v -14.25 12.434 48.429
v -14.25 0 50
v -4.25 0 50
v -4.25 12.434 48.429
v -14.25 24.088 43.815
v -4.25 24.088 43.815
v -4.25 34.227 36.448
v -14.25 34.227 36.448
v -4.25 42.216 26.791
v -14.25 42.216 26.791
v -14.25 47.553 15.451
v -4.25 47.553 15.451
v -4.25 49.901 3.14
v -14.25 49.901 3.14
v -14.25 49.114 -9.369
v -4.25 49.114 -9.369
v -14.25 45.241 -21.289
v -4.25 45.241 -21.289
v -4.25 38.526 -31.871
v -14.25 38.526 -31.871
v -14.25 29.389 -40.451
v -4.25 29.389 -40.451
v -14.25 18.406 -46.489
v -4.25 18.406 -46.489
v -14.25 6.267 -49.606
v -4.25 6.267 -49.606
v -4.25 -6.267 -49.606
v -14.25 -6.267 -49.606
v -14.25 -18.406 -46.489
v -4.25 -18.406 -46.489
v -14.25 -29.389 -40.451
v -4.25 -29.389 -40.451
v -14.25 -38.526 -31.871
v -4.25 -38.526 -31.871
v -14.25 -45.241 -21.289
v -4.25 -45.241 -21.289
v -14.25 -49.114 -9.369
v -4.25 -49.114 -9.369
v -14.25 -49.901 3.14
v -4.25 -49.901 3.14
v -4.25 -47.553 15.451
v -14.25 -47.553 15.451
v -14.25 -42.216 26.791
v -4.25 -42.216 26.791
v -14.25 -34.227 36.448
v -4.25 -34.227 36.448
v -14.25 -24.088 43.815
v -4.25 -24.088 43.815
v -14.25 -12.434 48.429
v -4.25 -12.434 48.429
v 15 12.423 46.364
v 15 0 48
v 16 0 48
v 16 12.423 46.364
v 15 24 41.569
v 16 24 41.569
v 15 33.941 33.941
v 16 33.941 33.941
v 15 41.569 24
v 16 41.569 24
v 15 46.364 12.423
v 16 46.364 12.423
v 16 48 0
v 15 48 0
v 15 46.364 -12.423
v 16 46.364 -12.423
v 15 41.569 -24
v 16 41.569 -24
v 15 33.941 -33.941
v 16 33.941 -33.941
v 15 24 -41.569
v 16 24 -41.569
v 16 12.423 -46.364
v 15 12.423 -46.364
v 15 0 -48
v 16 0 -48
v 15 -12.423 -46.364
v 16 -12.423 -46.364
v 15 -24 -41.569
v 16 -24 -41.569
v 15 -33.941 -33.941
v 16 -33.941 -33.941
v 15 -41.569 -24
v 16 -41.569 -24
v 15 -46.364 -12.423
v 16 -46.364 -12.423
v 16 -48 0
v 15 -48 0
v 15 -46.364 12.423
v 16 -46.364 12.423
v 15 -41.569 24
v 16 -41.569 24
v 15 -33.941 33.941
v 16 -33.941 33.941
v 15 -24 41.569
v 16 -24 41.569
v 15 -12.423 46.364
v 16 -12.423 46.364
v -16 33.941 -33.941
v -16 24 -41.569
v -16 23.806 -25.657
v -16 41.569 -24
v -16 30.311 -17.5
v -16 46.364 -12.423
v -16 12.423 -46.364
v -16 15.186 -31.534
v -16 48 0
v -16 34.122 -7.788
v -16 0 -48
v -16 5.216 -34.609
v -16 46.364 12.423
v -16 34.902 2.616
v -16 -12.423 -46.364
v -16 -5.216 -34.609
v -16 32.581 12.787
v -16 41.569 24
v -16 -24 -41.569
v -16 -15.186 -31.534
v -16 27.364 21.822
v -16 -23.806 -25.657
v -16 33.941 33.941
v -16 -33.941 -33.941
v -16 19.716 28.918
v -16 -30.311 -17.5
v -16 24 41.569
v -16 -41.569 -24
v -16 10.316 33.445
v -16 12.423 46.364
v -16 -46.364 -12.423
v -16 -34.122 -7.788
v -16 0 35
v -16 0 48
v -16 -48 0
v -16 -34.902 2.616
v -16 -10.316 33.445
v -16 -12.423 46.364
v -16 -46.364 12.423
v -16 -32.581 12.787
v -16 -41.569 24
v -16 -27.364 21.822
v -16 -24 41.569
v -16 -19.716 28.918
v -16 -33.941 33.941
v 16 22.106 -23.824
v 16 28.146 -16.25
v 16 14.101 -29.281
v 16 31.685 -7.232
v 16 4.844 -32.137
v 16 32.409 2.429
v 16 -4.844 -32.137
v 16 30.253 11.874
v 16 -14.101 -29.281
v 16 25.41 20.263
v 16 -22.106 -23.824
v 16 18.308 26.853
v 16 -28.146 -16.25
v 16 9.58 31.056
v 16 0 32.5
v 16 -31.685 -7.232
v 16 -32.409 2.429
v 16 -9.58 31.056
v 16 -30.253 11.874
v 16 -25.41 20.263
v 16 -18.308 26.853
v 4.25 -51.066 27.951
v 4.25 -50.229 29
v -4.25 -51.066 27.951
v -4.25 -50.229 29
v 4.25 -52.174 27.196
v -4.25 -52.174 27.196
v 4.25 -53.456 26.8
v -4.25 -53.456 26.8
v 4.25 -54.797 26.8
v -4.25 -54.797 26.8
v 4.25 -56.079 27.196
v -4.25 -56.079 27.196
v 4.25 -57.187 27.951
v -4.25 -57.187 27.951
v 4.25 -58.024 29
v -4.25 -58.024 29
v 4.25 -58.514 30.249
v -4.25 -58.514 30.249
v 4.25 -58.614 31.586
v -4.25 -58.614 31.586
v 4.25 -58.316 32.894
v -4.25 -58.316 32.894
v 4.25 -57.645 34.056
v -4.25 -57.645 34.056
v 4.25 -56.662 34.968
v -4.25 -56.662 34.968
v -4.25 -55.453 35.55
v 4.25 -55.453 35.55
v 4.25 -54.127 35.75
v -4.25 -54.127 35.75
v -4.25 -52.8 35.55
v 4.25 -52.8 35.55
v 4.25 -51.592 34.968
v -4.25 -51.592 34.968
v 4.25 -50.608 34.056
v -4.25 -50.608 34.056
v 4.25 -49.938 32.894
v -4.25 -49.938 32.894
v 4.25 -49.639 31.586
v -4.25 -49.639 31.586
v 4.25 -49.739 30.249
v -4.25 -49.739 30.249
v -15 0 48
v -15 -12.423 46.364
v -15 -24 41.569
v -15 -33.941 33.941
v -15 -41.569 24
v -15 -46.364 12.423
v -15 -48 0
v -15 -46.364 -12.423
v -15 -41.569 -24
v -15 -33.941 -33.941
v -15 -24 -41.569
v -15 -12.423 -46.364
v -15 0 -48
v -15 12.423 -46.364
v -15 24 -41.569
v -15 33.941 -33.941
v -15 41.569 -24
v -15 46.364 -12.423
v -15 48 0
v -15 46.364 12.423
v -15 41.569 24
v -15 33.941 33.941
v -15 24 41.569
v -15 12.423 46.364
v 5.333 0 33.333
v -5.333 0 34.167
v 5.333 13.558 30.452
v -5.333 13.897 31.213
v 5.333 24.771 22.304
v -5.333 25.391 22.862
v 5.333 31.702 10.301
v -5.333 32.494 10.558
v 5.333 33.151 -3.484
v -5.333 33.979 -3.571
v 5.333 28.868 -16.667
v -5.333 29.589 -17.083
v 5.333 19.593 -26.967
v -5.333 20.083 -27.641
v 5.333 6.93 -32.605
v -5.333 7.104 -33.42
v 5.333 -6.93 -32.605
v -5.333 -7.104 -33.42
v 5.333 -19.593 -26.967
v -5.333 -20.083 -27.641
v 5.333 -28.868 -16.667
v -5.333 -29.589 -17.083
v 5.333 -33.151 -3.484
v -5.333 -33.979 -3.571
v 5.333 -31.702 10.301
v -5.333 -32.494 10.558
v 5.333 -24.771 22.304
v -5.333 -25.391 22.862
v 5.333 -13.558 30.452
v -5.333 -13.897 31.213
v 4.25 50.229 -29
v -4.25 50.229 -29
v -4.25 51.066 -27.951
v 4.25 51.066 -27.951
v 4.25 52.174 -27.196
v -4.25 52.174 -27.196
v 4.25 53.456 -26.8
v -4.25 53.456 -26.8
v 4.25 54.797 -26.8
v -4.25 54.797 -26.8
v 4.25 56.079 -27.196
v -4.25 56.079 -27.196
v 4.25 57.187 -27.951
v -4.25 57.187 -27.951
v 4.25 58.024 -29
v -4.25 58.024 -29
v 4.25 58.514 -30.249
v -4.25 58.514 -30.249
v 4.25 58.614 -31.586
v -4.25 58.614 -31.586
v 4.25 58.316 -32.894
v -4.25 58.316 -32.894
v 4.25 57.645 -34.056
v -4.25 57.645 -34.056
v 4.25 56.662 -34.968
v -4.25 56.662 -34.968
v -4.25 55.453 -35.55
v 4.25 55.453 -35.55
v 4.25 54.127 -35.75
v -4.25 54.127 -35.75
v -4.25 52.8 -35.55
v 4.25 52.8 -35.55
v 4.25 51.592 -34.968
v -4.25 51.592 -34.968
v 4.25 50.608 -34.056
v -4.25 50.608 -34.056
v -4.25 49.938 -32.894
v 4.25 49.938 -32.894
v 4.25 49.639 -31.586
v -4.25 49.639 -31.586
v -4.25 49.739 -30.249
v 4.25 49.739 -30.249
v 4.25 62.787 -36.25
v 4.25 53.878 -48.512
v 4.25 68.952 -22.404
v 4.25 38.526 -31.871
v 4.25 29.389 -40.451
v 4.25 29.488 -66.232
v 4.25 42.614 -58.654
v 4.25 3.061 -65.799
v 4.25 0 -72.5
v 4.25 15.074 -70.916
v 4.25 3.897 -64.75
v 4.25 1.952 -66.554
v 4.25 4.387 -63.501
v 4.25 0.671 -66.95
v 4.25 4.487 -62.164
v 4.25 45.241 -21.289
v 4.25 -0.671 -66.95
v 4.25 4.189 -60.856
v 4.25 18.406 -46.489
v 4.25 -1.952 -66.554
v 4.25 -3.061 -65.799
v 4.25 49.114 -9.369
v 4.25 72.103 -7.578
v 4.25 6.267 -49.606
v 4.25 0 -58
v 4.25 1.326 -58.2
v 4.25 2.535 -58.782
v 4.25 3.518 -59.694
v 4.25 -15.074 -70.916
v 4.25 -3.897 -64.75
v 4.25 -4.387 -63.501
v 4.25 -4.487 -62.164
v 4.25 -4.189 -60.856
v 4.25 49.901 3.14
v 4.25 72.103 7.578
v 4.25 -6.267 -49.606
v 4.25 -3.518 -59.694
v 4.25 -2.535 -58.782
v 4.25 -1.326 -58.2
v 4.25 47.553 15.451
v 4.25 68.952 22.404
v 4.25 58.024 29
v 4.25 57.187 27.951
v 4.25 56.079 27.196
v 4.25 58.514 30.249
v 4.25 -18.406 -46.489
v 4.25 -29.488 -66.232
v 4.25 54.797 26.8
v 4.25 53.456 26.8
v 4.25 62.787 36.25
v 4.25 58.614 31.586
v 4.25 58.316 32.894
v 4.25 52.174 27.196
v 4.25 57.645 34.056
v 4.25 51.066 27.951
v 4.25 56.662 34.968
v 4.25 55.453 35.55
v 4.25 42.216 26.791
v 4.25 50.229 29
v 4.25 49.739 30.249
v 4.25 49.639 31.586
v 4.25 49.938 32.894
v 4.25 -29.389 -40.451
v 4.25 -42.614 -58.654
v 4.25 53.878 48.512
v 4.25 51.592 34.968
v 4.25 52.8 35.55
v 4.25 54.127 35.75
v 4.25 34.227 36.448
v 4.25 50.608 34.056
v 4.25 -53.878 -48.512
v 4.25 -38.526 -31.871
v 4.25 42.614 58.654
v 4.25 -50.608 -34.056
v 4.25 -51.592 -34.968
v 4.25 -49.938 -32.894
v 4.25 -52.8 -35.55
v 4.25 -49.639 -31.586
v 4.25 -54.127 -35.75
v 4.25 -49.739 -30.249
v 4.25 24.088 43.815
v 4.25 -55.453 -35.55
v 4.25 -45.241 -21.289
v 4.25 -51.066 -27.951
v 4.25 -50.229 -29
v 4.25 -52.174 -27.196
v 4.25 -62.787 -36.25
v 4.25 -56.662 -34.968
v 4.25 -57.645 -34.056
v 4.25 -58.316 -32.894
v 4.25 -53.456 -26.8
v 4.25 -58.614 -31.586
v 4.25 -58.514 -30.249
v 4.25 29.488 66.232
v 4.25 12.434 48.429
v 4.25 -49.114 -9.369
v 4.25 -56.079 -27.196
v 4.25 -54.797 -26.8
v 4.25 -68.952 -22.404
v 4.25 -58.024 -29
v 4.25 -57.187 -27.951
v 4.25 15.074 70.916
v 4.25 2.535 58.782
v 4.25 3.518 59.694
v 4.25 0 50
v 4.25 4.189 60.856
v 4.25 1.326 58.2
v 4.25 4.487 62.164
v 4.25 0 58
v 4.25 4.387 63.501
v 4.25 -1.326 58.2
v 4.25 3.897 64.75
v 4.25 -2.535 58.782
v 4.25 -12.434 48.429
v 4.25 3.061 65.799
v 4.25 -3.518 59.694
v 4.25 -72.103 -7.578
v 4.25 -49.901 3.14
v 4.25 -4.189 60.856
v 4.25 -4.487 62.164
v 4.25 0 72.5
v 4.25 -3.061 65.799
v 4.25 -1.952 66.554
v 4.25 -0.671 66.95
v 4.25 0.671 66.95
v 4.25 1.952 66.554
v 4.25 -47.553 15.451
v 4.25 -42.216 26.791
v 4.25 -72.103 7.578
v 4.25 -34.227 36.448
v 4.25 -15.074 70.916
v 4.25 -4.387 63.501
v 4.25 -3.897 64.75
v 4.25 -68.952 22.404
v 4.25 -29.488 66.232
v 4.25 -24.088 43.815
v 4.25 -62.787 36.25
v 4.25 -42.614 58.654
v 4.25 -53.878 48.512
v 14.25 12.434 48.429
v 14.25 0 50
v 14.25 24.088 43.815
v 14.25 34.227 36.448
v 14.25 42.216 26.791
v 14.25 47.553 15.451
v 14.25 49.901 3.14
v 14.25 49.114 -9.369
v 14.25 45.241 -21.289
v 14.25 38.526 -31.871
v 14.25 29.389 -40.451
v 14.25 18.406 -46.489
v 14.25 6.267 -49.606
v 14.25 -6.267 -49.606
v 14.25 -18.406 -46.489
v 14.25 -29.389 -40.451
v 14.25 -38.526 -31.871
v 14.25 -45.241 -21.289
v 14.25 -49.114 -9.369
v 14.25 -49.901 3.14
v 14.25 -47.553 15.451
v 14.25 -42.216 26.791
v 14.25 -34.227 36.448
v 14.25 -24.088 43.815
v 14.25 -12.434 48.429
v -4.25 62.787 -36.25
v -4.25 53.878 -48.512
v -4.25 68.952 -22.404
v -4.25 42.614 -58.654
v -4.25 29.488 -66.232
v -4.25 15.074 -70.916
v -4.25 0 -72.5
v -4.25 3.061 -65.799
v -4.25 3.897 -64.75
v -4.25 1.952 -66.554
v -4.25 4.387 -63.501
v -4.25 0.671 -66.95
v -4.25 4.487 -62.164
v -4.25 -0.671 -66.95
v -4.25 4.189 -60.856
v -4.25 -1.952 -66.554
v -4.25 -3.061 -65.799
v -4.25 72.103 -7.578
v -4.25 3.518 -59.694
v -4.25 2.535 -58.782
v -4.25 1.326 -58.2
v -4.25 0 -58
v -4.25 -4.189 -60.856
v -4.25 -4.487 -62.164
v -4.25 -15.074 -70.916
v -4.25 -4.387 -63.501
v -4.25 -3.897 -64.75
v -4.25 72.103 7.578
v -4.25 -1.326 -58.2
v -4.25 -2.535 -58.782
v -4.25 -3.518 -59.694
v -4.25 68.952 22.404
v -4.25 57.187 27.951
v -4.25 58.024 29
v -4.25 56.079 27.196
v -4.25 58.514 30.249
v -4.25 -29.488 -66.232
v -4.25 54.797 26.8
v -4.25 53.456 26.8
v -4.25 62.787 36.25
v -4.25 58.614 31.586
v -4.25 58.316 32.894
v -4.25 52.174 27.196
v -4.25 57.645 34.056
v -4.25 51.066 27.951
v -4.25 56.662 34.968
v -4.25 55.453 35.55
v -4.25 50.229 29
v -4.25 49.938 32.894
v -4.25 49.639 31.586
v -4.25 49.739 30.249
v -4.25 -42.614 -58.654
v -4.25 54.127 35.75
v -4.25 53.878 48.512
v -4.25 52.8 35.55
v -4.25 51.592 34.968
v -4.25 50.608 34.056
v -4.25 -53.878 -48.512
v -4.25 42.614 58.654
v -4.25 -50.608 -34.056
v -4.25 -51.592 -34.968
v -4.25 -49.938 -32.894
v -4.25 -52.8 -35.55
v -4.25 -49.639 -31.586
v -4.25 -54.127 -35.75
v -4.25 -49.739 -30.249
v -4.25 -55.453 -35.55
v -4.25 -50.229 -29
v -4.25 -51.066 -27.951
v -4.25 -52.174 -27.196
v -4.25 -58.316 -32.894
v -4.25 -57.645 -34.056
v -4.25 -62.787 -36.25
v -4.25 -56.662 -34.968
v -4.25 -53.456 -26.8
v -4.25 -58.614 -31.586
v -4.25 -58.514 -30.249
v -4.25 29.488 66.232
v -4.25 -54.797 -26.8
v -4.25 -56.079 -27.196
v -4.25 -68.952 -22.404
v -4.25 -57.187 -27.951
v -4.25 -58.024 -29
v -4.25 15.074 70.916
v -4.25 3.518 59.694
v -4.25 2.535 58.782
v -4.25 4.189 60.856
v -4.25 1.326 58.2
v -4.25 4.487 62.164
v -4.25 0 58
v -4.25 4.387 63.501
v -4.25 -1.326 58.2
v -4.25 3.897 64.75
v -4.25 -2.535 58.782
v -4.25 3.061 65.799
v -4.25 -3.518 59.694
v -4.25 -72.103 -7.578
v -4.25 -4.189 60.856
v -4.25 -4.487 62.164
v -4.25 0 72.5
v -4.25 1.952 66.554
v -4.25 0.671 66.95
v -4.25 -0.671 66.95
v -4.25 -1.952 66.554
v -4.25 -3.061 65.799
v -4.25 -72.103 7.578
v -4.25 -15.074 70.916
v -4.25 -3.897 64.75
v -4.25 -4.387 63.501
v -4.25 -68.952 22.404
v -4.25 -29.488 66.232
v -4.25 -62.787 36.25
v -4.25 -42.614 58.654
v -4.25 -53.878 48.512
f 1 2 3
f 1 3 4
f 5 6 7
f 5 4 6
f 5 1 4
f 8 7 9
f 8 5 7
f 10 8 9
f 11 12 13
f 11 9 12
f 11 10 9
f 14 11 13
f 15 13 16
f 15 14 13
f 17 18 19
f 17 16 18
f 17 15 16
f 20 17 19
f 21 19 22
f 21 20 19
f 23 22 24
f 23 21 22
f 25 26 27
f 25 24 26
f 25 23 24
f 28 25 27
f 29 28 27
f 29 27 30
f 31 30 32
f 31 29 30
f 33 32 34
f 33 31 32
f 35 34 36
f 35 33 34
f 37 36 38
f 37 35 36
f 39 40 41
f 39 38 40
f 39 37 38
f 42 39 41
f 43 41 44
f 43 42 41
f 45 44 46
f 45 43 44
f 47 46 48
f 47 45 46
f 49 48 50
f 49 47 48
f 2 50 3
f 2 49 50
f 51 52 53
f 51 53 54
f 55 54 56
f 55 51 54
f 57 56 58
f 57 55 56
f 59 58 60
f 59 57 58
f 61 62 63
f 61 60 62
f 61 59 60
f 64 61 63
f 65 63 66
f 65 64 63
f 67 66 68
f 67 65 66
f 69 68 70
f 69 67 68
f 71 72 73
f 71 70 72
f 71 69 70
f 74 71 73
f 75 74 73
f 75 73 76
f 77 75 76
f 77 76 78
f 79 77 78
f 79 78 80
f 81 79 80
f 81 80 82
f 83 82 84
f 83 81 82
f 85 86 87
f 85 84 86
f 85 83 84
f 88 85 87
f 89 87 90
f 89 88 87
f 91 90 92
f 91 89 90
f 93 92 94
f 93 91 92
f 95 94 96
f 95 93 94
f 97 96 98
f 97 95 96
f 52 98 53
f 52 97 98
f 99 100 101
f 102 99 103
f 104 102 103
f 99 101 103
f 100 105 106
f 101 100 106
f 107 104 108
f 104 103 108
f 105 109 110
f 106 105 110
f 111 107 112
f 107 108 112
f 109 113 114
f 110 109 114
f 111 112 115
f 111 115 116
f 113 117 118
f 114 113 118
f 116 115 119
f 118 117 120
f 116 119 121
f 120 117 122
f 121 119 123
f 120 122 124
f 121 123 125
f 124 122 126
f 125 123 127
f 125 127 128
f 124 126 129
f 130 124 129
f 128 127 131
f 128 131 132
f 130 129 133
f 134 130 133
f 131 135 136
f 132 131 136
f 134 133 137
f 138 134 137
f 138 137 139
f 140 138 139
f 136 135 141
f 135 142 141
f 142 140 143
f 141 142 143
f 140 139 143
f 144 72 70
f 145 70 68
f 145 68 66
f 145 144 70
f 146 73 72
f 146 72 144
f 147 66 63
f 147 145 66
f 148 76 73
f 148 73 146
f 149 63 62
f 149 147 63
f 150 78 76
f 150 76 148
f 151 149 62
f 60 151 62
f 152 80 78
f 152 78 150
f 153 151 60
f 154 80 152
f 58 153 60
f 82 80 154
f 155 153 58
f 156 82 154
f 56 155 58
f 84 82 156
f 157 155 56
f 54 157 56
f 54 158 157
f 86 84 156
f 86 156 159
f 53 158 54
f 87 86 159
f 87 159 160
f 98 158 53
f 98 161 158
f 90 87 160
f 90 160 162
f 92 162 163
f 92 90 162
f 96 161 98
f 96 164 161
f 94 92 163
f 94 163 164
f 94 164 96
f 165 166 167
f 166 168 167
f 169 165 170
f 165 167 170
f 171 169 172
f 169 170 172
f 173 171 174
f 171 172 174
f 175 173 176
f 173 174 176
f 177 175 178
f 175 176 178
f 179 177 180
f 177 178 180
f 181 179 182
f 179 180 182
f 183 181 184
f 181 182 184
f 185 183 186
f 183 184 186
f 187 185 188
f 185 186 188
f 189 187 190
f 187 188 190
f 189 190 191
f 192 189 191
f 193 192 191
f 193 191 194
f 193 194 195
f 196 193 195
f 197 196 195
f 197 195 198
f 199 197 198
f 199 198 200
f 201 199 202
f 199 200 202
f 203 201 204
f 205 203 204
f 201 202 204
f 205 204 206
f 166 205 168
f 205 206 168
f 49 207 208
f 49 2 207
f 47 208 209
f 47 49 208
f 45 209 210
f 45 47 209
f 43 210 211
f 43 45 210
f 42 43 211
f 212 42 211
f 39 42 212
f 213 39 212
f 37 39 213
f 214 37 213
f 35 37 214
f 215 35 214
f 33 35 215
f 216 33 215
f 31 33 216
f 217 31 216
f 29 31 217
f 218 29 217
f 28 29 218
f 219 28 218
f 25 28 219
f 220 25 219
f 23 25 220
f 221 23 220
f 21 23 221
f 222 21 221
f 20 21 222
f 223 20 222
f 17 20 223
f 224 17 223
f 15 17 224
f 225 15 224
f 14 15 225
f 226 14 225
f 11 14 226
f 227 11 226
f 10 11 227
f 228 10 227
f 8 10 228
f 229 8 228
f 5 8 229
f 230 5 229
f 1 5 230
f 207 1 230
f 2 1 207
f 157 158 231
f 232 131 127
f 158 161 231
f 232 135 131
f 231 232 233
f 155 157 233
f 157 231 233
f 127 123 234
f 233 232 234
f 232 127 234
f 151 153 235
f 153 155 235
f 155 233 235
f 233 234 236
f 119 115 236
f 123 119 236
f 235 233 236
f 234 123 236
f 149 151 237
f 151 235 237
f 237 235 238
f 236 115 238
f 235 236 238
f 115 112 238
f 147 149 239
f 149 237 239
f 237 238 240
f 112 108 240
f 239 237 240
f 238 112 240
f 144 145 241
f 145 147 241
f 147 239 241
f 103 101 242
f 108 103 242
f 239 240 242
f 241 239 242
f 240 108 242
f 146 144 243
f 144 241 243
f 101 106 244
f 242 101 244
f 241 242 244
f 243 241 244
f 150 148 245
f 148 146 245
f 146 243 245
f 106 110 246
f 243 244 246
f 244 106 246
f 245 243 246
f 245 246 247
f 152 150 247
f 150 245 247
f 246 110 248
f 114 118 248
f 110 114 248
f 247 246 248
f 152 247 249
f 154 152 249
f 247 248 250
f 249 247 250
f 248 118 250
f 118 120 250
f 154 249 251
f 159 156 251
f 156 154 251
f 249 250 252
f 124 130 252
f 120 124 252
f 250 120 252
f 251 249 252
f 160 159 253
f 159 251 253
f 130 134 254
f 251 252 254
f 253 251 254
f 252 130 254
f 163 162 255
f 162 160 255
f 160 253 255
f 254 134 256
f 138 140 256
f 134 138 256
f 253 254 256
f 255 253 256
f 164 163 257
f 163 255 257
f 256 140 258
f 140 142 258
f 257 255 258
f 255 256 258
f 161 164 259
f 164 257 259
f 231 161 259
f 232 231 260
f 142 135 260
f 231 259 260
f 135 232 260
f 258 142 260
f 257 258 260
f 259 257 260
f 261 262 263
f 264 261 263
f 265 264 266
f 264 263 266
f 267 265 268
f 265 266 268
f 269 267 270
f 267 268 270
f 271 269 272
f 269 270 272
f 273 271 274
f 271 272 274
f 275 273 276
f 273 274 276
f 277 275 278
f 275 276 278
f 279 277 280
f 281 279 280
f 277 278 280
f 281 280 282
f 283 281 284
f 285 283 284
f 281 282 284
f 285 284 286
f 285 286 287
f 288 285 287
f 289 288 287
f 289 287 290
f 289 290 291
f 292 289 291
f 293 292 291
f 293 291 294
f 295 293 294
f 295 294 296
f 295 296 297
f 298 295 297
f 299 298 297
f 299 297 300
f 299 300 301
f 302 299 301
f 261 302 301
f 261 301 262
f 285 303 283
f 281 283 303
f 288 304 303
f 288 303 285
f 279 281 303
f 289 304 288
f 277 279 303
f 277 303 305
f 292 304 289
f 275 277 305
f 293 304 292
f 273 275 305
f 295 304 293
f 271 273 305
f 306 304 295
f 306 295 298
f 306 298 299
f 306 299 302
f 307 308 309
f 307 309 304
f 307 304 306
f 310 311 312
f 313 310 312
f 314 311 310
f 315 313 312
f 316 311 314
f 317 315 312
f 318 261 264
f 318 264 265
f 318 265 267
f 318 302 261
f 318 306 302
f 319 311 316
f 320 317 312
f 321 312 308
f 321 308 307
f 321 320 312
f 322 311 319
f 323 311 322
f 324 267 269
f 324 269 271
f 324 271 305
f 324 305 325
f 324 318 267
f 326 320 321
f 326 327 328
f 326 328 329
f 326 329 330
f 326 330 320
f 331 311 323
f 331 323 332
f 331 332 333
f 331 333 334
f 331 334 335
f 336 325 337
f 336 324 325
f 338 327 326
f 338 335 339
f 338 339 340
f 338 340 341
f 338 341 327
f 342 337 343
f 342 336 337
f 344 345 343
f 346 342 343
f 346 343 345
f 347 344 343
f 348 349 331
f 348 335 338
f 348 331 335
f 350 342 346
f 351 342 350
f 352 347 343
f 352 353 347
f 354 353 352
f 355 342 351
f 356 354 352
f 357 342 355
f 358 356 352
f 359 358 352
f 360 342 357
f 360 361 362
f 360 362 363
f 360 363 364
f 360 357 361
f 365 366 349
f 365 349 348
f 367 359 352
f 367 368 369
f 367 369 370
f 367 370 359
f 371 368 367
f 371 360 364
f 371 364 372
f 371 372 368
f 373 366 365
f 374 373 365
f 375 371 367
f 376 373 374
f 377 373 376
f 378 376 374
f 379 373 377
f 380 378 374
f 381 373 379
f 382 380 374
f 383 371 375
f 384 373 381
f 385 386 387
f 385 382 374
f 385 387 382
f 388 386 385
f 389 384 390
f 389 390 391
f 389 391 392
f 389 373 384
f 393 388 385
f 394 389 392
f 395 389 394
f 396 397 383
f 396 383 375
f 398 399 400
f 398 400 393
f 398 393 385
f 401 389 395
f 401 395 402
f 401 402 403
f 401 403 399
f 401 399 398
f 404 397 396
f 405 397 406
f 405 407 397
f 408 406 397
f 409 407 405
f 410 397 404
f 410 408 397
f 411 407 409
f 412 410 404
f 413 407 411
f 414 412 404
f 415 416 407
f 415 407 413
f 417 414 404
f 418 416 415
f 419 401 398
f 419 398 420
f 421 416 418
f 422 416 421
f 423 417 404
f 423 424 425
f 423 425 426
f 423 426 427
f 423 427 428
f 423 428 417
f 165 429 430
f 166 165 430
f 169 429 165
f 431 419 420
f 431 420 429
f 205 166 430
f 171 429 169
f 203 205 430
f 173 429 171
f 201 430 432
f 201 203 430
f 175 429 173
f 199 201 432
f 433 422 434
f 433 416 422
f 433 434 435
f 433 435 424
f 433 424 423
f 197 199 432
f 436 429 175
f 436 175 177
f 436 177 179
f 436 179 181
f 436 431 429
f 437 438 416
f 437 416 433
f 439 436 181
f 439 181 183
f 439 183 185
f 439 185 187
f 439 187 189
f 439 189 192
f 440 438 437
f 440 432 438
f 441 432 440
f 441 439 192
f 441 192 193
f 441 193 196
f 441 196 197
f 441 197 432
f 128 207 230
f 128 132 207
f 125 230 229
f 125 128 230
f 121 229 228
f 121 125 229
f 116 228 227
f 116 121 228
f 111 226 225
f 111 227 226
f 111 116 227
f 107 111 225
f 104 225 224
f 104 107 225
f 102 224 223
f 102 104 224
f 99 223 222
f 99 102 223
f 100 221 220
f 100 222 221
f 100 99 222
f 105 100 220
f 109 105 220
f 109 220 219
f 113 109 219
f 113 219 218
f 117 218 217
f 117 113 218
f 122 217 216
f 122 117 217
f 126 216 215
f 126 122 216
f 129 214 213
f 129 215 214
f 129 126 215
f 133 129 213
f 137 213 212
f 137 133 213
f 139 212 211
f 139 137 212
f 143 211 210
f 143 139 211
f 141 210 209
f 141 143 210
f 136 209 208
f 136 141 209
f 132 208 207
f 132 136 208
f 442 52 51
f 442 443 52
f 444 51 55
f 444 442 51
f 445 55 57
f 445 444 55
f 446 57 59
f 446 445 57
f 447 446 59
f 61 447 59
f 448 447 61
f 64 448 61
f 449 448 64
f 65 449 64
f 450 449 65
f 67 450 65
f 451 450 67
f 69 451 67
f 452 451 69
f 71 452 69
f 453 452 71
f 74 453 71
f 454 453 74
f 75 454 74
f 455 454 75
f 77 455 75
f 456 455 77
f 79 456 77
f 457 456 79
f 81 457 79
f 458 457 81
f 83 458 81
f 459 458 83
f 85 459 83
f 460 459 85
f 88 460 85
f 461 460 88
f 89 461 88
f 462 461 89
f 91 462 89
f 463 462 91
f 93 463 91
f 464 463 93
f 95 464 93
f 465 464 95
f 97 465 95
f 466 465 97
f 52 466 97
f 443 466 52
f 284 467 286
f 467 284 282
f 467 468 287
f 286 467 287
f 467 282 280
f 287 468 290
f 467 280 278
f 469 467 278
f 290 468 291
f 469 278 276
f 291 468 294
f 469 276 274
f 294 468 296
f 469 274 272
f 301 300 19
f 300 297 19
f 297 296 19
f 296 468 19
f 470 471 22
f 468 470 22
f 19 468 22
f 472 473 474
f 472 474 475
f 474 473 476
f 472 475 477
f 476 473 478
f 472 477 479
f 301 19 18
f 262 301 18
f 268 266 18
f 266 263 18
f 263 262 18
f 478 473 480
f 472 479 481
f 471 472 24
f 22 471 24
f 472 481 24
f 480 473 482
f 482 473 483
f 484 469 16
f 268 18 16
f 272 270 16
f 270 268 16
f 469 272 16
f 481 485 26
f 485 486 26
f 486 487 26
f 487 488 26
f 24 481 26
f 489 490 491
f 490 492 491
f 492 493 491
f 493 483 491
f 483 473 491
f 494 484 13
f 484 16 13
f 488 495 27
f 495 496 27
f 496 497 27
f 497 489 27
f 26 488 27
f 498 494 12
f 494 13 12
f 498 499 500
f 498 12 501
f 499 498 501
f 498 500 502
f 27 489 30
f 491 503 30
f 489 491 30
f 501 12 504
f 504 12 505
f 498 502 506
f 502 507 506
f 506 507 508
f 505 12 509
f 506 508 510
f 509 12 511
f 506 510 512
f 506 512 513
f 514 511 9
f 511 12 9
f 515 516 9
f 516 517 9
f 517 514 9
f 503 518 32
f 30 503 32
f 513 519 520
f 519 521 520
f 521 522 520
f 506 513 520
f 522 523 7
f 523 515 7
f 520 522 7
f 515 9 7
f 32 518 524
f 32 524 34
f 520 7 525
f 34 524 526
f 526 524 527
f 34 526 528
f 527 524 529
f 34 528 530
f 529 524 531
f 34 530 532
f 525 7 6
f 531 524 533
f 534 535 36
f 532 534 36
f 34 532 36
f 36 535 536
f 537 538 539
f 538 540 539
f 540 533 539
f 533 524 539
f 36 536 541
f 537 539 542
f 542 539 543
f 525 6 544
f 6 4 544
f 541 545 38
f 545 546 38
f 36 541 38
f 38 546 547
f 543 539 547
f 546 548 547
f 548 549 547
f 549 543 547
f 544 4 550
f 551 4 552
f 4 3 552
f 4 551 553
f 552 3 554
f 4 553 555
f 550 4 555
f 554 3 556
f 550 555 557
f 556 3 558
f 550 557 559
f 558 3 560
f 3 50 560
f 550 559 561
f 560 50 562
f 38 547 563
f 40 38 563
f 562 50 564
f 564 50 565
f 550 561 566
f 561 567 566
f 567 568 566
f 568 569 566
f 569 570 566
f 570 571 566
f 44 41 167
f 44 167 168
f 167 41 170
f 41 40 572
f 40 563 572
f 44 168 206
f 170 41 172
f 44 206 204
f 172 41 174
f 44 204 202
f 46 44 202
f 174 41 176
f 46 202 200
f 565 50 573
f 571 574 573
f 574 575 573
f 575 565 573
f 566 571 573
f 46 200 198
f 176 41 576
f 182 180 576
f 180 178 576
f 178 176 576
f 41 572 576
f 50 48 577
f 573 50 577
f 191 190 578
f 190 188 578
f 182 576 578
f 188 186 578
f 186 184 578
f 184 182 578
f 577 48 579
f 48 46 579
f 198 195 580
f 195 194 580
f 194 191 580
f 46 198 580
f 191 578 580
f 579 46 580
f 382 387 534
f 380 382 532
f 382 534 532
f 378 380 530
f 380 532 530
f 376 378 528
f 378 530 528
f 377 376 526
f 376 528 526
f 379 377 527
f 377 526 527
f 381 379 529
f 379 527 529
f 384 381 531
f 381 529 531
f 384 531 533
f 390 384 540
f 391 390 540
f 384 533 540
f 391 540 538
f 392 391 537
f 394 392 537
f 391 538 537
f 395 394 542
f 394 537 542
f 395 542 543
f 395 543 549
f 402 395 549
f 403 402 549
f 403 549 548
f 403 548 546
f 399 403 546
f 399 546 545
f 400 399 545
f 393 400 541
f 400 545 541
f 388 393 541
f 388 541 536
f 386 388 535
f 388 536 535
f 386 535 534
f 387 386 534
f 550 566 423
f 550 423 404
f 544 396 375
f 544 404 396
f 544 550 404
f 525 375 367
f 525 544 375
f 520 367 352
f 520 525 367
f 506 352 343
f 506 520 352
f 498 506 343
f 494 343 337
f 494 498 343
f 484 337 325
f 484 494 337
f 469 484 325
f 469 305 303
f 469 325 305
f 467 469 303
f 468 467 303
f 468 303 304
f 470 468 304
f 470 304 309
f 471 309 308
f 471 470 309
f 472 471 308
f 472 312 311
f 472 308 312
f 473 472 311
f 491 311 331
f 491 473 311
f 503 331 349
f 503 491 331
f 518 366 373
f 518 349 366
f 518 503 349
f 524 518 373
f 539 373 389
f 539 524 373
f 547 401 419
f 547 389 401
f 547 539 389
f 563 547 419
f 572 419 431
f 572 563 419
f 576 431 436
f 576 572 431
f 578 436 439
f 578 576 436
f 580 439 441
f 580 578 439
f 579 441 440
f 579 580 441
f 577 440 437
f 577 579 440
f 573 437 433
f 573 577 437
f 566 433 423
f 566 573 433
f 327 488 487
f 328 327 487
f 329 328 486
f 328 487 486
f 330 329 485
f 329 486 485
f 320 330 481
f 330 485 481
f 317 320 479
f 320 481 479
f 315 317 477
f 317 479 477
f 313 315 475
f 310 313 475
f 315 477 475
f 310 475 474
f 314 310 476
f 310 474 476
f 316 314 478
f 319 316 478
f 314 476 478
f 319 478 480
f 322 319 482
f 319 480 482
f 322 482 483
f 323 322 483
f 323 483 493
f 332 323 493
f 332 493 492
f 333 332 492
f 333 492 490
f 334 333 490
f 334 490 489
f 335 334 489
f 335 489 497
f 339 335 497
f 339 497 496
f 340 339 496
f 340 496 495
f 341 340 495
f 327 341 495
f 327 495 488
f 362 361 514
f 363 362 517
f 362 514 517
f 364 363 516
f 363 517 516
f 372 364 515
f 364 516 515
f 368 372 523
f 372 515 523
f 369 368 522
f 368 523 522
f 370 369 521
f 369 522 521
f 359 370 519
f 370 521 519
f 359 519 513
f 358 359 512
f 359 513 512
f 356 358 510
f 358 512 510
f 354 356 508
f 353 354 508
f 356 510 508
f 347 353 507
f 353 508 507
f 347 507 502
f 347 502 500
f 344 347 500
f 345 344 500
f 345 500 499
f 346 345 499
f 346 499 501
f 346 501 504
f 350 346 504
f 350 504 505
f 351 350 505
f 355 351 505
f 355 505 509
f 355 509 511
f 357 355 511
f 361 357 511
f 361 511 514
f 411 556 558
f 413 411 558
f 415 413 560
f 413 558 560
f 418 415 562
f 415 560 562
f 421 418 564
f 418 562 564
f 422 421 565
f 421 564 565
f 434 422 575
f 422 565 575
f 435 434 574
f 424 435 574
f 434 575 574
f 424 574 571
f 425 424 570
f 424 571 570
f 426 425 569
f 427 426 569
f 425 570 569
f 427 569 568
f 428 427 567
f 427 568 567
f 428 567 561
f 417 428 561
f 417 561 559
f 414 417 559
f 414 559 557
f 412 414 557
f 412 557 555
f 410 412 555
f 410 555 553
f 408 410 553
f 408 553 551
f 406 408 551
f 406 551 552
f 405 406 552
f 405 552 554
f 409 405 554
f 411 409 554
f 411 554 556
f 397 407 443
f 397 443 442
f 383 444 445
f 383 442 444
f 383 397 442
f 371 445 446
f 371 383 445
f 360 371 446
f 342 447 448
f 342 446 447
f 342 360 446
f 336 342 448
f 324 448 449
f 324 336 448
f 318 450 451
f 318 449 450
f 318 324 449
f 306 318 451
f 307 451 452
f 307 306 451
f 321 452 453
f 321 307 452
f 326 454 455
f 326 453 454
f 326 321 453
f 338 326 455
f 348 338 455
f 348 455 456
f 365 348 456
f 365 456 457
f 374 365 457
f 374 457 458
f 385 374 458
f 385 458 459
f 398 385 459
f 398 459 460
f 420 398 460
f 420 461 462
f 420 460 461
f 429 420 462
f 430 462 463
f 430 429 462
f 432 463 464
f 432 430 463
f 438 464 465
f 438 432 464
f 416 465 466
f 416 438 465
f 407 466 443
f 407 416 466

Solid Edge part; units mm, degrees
sketch "Sketch1" plane through (0, 0, 0) normal (0, -1, 0) x (1, 0, 0)
  line L0 (-4.25, 72.5) -> (-4.25, 50)
  line L1 (-4.25, 50) -> (-14.25, 50)
  line L2 (-14.25, 50) -> (-15, 48)
  line L3 (-15, 48) -> (-16, 48)
  line L4 (-16, 48) -> (-16, 35)
  line L5 (-16, 35) -> (16, 32.5)
  line L6 (16, 48) -> (16, 32.5)
  line L7 (16, 48) -> (15, 48)
  line L8 (15, 48) -> (14.25, 50)
  line L9 (14.25, 50) -> (4.25, 50)
  line L10 (4.25, 50) -> (4.25, 72.5)
  line L11 (4.25, 72.5) -> (-4.25, 72.5)
  dimension "D1" = 72.5
  dimension "D2" = 50
  dimension "D3" = 48
  dimension "D4" = 10
  dimension "D5" = 16
  dimension "D6" = 16
  dimension "D7" = 8.5
  dimension "D8" = 1
  dimension "D9" = 11.75
  dimension "D10" = 35
  dimension "D11" = 32.5
revolve "RevolvedProtrusion1" add sketch "Sketch1" angle 360 about axis through (-60, 0, 0) along (1, 0, 0)
hole "Hole1" at (-4.25, 0, -62.5) direction (1, 0, 0) diameter 9 end up to next
pattern_circular "Pattern1" count 6 over 360 about axis through (-4.25, 0, 0) along (-1, 0, 0) of "Hole1"
extrude "Cutout1" [suppressed]
hole "Bohrung_9" [suppressed]
properties material "Stahl"
